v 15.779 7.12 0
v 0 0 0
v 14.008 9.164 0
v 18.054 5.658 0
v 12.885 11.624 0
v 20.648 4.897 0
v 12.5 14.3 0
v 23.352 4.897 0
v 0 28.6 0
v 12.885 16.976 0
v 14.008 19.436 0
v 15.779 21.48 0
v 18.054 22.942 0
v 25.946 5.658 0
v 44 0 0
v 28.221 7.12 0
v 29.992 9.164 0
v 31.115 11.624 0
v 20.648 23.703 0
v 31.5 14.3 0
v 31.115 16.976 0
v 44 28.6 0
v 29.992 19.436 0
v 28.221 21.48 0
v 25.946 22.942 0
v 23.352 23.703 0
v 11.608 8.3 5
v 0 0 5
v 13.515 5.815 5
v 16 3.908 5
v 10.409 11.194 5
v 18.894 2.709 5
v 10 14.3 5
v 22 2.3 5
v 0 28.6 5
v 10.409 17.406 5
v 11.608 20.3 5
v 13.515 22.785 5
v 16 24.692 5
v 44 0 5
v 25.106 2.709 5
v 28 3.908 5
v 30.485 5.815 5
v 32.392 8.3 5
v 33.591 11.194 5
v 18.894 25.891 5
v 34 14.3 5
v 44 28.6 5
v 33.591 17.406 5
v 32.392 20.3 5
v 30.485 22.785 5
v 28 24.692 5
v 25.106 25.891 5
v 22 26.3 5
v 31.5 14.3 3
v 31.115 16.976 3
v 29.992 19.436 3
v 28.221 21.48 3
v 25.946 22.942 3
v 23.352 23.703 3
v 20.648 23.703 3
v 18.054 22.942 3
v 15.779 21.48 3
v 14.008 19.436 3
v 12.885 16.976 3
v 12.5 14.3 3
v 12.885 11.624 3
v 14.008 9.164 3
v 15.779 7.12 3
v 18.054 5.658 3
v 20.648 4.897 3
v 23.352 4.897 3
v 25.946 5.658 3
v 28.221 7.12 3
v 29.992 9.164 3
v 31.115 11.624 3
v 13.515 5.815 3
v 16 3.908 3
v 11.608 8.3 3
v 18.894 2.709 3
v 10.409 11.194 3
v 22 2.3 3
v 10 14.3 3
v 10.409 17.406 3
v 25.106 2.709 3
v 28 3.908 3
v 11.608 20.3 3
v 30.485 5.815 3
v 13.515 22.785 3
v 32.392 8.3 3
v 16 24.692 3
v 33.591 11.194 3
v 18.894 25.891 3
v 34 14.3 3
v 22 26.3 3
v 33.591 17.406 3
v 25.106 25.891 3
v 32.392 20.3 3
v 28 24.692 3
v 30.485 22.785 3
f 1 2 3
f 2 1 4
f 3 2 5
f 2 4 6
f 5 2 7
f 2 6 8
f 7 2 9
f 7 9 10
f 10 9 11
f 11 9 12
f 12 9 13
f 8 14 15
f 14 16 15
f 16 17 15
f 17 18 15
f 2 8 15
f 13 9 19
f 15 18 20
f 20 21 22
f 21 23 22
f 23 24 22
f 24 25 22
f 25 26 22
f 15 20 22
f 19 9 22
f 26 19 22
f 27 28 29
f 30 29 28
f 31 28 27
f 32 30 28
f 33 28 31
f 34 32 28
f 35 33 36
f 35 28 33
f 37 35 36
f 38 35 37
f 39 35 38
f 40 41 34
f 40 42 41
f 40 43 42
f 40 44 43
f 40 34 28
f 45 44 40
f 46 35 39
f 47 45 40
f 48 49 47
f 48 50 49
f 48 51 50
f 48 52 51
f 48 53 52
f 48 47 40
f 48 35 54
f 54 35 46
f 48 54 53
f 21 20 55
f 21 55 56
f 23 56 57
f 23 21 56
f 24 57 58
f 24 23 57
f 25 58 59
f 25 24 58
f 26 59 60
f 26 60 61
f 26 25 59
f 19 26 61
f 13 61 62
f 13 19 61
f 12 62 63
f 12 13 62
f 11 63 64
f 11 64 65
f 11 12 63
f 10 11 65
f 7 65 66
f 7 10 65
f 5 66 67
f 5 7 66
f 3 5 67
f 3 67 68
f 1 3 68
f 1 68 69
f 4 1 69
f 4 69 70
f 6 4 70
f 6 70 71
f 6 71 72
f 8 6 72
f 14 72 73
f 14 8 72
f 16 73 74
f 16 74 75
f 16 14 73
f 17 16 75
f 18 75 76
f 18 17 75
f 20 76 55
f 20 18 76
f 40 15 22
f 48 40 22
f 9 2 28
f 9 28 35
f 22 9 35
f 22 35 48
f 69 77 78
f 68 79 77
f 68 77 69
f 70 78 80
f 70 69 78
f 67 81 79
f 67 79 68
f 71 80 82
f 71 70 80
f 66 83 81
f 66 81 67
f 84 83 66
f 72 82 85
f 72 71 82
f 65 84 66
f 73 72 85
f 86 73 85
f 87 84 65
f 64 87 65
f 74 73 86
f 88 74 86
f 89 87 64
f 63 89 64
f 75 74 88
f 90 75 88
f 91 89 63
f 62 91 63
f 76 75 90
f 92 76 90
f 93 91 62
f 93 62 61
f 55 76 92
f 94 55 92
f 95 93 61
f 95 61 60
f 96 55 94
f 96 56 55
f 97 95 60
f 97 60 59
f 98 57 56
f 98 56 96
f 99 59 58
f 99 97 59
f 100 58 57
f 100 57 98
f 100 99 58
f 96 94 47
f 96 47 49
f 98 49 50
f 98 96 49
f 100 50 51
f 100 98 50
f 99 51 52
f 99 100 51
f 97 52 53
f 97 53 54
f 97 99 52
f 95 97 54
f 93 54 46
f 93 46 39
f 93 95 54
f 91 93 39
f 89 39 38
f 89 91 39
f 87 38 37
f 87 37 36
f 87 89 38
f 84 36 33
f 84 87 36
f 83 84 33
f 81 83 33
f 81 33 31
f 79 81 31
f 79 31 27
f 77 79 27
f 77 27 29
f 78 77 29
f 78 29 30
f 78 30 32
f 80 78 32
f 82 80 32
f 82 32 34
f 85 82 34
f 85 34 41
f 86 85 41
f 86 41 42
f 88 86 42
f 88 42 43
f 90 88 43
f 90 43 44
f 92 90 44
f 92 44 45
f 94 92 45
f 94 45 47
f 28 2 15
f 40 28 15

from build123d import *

# Parameters (mm, degrees)
F0_W     = 44
F0_H     = 28.6
F0_R     = 12
F1_DEPTH = 5
F0_R_2   = 9.5
F2_DEPTH = 3


with BuildPart() as f1:
    # F0 (on Top) → F1 (new body)
    with BuildSketch(Plane.XY):
        with Locations((22, 14.3)):
            Rectangle(F0_W, F0_H)
        with Locations((22, 14.3)):
            Circle(F0_R, mode=Mode.SUBTRACT)
    extrude(amount=F1_DEPTH)

    # F0 (on Top) → F2 (join)
    with BuildSketch(Plane.XY):
        with Locations((22, 14.3)):
            Circle(F0_R)
        with Locations((22, 14.3)):
            Circle(F0_R_2, mode=Mode.SUBTRACT)
    extrude(amount=F2_DEPTH)


solid = f1.part
